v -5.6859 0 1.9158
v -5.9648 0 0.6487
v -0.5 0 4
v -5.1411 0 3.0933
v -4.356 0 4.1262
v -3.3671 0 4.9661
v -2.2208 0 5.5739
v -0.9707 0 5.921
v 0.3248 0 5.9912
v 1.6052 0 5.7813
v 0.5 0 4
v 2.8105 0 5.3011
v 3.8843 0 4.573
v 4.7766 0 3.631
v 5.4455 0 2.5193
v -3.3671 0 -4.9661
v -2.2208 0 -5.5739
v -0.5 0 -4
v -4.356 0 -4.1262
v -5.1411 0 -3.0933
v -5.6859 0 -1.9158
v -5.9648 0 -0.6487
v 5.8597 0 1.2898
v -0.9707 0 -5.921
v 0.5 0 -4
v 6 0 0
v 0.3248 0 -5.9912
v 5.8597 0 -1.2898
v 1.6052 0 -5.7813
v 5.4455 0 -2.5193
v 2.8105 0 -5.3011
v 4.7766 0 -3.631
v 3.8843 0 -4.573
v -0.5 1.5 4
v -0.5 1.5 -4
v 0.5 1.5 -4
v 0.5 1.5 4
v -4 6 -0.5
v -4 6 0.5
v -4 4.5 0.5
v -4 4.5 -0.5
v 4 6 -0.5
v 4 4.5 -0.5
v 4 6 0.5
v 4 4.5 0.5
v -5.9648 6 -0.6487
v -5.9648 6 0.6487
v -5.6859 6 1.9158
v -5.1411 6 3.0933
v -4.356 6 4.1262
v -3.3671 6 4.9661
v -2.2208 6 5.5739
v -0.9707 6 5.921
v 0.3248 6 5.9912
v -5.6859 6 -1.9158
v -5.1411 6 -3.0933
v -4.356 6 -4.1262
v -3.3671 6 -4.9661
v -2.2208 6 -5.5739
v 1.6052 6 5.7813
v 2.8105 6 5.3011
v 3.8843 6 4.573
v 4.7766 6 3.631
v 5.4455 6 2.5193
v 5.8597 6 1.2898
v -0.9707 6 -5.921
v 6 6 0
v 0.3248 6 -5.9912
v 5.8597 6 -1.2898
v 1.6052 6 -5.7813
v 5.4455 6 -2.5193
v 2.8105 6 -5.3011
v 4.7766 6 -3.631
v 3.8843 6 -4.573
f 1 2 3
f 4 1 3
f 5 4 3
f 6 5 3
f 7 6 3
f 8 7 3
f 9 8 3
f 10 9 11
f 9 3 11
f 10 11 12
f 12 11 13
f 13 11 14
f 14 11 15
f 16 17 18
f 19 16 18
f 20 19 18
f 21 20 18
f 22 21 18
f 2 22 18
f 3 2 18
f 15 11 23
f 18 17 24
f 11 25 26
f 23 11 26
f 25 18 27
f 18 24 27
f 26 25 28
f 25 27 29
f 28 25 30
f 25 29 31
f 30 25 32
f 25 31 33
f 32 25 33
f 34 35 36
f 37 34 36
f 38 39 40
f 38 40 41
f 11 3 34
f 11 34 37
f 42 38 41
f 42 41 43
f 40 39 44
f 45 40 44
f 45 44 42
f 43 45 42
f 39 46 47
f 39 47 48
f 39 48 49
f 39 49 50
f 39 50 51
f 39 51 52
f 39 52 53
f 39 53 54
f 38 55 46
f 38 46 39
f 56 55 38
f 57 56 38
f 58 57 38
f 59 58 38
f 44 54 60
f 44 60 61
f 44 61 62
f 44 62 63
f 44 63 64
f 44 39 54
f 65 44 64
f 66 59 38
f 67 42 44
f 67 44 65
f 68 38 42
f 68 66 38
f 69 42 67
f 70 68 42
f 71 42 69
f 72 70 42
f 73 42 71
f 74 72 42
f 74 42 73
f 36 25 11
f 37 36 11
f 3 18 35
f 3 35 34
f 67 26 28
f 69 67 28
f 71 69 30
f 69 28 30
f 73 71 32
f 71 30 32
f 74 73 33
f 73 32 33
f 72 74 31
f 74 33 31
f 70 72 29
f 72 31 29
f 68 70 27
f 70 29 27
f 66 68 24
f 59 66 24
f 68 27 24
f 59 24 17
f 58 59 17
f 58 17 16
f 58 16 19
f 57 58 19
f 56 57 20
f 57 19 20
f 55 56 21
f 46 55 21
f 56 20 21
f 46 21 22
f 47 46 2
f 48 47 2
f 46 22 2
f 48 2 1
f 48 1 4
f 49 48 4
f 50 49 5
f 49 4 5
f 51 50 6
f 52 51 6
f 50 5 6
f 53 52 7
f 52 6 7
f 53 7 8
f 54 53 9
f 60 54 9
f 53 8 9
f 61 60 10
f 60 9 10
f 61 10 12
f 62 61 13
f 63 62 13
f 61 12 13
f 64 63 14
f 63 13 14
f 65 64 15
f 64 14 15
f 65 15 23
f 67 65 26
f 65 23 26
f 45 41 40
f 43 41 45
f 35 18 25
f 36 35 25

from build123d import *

# Parameters (mm, degrees)
SKIZZE1_R                       = 6
AUFSATZ_LINEAR_AUSTRAGEN1_DEPTH = 6
SKIZZE2_W                       = 8
SKIZZE2_H                       = 1
SCHNITT_LINEAR_AUSTRAGEN1_DEPTH = 1.5
SKIZZE3_W                       = 1
SKIZZE3_H                       = 8
SCHNITT_LINEAR_AUSTRAGEN2_DEPTH = 1.5


with BuildPart() as part:
    # Skizze1 → Aufsatz-Linear austragen1 (new body)
    with BuildSketch(Plane(origin=(0, 0, 0), x_dir=(1, 0, 0), z_dir=(0, 1, 0))):
        Circle(SKIZZE1_R)
    extrude(amount=AUFSATZ_LINEAR_AUSTRAGEN1_DEPTH)

    # Skizze2 → Schnitt-Linear austragen1 (cut)
    with BuildSketch(Plane(origin=(0, 6, 0), x_dir=(1, 0, 0), z_dir=(0, 1, 0))):
        Rectangle(SKIZZE2_W, SKIZZE2_H)
    extrude(amount=-SCHNITT_LINEAR_AUSTRAGEN1_DEPTH, mode=Mode.SUBTRACT)

    # Skizze3 → Schnitt-Linear austragen2 (cut)
    with BuildSketch(Plane.XZ):
        Rectangle(SKIZZE3_W, SKIZZE3_H)
    extrude(amount=-SCHNITT_LINEAR_AUSTRAGEN2_DEPTH, mode=Mode.SUBTRACT)


solid = part.part
